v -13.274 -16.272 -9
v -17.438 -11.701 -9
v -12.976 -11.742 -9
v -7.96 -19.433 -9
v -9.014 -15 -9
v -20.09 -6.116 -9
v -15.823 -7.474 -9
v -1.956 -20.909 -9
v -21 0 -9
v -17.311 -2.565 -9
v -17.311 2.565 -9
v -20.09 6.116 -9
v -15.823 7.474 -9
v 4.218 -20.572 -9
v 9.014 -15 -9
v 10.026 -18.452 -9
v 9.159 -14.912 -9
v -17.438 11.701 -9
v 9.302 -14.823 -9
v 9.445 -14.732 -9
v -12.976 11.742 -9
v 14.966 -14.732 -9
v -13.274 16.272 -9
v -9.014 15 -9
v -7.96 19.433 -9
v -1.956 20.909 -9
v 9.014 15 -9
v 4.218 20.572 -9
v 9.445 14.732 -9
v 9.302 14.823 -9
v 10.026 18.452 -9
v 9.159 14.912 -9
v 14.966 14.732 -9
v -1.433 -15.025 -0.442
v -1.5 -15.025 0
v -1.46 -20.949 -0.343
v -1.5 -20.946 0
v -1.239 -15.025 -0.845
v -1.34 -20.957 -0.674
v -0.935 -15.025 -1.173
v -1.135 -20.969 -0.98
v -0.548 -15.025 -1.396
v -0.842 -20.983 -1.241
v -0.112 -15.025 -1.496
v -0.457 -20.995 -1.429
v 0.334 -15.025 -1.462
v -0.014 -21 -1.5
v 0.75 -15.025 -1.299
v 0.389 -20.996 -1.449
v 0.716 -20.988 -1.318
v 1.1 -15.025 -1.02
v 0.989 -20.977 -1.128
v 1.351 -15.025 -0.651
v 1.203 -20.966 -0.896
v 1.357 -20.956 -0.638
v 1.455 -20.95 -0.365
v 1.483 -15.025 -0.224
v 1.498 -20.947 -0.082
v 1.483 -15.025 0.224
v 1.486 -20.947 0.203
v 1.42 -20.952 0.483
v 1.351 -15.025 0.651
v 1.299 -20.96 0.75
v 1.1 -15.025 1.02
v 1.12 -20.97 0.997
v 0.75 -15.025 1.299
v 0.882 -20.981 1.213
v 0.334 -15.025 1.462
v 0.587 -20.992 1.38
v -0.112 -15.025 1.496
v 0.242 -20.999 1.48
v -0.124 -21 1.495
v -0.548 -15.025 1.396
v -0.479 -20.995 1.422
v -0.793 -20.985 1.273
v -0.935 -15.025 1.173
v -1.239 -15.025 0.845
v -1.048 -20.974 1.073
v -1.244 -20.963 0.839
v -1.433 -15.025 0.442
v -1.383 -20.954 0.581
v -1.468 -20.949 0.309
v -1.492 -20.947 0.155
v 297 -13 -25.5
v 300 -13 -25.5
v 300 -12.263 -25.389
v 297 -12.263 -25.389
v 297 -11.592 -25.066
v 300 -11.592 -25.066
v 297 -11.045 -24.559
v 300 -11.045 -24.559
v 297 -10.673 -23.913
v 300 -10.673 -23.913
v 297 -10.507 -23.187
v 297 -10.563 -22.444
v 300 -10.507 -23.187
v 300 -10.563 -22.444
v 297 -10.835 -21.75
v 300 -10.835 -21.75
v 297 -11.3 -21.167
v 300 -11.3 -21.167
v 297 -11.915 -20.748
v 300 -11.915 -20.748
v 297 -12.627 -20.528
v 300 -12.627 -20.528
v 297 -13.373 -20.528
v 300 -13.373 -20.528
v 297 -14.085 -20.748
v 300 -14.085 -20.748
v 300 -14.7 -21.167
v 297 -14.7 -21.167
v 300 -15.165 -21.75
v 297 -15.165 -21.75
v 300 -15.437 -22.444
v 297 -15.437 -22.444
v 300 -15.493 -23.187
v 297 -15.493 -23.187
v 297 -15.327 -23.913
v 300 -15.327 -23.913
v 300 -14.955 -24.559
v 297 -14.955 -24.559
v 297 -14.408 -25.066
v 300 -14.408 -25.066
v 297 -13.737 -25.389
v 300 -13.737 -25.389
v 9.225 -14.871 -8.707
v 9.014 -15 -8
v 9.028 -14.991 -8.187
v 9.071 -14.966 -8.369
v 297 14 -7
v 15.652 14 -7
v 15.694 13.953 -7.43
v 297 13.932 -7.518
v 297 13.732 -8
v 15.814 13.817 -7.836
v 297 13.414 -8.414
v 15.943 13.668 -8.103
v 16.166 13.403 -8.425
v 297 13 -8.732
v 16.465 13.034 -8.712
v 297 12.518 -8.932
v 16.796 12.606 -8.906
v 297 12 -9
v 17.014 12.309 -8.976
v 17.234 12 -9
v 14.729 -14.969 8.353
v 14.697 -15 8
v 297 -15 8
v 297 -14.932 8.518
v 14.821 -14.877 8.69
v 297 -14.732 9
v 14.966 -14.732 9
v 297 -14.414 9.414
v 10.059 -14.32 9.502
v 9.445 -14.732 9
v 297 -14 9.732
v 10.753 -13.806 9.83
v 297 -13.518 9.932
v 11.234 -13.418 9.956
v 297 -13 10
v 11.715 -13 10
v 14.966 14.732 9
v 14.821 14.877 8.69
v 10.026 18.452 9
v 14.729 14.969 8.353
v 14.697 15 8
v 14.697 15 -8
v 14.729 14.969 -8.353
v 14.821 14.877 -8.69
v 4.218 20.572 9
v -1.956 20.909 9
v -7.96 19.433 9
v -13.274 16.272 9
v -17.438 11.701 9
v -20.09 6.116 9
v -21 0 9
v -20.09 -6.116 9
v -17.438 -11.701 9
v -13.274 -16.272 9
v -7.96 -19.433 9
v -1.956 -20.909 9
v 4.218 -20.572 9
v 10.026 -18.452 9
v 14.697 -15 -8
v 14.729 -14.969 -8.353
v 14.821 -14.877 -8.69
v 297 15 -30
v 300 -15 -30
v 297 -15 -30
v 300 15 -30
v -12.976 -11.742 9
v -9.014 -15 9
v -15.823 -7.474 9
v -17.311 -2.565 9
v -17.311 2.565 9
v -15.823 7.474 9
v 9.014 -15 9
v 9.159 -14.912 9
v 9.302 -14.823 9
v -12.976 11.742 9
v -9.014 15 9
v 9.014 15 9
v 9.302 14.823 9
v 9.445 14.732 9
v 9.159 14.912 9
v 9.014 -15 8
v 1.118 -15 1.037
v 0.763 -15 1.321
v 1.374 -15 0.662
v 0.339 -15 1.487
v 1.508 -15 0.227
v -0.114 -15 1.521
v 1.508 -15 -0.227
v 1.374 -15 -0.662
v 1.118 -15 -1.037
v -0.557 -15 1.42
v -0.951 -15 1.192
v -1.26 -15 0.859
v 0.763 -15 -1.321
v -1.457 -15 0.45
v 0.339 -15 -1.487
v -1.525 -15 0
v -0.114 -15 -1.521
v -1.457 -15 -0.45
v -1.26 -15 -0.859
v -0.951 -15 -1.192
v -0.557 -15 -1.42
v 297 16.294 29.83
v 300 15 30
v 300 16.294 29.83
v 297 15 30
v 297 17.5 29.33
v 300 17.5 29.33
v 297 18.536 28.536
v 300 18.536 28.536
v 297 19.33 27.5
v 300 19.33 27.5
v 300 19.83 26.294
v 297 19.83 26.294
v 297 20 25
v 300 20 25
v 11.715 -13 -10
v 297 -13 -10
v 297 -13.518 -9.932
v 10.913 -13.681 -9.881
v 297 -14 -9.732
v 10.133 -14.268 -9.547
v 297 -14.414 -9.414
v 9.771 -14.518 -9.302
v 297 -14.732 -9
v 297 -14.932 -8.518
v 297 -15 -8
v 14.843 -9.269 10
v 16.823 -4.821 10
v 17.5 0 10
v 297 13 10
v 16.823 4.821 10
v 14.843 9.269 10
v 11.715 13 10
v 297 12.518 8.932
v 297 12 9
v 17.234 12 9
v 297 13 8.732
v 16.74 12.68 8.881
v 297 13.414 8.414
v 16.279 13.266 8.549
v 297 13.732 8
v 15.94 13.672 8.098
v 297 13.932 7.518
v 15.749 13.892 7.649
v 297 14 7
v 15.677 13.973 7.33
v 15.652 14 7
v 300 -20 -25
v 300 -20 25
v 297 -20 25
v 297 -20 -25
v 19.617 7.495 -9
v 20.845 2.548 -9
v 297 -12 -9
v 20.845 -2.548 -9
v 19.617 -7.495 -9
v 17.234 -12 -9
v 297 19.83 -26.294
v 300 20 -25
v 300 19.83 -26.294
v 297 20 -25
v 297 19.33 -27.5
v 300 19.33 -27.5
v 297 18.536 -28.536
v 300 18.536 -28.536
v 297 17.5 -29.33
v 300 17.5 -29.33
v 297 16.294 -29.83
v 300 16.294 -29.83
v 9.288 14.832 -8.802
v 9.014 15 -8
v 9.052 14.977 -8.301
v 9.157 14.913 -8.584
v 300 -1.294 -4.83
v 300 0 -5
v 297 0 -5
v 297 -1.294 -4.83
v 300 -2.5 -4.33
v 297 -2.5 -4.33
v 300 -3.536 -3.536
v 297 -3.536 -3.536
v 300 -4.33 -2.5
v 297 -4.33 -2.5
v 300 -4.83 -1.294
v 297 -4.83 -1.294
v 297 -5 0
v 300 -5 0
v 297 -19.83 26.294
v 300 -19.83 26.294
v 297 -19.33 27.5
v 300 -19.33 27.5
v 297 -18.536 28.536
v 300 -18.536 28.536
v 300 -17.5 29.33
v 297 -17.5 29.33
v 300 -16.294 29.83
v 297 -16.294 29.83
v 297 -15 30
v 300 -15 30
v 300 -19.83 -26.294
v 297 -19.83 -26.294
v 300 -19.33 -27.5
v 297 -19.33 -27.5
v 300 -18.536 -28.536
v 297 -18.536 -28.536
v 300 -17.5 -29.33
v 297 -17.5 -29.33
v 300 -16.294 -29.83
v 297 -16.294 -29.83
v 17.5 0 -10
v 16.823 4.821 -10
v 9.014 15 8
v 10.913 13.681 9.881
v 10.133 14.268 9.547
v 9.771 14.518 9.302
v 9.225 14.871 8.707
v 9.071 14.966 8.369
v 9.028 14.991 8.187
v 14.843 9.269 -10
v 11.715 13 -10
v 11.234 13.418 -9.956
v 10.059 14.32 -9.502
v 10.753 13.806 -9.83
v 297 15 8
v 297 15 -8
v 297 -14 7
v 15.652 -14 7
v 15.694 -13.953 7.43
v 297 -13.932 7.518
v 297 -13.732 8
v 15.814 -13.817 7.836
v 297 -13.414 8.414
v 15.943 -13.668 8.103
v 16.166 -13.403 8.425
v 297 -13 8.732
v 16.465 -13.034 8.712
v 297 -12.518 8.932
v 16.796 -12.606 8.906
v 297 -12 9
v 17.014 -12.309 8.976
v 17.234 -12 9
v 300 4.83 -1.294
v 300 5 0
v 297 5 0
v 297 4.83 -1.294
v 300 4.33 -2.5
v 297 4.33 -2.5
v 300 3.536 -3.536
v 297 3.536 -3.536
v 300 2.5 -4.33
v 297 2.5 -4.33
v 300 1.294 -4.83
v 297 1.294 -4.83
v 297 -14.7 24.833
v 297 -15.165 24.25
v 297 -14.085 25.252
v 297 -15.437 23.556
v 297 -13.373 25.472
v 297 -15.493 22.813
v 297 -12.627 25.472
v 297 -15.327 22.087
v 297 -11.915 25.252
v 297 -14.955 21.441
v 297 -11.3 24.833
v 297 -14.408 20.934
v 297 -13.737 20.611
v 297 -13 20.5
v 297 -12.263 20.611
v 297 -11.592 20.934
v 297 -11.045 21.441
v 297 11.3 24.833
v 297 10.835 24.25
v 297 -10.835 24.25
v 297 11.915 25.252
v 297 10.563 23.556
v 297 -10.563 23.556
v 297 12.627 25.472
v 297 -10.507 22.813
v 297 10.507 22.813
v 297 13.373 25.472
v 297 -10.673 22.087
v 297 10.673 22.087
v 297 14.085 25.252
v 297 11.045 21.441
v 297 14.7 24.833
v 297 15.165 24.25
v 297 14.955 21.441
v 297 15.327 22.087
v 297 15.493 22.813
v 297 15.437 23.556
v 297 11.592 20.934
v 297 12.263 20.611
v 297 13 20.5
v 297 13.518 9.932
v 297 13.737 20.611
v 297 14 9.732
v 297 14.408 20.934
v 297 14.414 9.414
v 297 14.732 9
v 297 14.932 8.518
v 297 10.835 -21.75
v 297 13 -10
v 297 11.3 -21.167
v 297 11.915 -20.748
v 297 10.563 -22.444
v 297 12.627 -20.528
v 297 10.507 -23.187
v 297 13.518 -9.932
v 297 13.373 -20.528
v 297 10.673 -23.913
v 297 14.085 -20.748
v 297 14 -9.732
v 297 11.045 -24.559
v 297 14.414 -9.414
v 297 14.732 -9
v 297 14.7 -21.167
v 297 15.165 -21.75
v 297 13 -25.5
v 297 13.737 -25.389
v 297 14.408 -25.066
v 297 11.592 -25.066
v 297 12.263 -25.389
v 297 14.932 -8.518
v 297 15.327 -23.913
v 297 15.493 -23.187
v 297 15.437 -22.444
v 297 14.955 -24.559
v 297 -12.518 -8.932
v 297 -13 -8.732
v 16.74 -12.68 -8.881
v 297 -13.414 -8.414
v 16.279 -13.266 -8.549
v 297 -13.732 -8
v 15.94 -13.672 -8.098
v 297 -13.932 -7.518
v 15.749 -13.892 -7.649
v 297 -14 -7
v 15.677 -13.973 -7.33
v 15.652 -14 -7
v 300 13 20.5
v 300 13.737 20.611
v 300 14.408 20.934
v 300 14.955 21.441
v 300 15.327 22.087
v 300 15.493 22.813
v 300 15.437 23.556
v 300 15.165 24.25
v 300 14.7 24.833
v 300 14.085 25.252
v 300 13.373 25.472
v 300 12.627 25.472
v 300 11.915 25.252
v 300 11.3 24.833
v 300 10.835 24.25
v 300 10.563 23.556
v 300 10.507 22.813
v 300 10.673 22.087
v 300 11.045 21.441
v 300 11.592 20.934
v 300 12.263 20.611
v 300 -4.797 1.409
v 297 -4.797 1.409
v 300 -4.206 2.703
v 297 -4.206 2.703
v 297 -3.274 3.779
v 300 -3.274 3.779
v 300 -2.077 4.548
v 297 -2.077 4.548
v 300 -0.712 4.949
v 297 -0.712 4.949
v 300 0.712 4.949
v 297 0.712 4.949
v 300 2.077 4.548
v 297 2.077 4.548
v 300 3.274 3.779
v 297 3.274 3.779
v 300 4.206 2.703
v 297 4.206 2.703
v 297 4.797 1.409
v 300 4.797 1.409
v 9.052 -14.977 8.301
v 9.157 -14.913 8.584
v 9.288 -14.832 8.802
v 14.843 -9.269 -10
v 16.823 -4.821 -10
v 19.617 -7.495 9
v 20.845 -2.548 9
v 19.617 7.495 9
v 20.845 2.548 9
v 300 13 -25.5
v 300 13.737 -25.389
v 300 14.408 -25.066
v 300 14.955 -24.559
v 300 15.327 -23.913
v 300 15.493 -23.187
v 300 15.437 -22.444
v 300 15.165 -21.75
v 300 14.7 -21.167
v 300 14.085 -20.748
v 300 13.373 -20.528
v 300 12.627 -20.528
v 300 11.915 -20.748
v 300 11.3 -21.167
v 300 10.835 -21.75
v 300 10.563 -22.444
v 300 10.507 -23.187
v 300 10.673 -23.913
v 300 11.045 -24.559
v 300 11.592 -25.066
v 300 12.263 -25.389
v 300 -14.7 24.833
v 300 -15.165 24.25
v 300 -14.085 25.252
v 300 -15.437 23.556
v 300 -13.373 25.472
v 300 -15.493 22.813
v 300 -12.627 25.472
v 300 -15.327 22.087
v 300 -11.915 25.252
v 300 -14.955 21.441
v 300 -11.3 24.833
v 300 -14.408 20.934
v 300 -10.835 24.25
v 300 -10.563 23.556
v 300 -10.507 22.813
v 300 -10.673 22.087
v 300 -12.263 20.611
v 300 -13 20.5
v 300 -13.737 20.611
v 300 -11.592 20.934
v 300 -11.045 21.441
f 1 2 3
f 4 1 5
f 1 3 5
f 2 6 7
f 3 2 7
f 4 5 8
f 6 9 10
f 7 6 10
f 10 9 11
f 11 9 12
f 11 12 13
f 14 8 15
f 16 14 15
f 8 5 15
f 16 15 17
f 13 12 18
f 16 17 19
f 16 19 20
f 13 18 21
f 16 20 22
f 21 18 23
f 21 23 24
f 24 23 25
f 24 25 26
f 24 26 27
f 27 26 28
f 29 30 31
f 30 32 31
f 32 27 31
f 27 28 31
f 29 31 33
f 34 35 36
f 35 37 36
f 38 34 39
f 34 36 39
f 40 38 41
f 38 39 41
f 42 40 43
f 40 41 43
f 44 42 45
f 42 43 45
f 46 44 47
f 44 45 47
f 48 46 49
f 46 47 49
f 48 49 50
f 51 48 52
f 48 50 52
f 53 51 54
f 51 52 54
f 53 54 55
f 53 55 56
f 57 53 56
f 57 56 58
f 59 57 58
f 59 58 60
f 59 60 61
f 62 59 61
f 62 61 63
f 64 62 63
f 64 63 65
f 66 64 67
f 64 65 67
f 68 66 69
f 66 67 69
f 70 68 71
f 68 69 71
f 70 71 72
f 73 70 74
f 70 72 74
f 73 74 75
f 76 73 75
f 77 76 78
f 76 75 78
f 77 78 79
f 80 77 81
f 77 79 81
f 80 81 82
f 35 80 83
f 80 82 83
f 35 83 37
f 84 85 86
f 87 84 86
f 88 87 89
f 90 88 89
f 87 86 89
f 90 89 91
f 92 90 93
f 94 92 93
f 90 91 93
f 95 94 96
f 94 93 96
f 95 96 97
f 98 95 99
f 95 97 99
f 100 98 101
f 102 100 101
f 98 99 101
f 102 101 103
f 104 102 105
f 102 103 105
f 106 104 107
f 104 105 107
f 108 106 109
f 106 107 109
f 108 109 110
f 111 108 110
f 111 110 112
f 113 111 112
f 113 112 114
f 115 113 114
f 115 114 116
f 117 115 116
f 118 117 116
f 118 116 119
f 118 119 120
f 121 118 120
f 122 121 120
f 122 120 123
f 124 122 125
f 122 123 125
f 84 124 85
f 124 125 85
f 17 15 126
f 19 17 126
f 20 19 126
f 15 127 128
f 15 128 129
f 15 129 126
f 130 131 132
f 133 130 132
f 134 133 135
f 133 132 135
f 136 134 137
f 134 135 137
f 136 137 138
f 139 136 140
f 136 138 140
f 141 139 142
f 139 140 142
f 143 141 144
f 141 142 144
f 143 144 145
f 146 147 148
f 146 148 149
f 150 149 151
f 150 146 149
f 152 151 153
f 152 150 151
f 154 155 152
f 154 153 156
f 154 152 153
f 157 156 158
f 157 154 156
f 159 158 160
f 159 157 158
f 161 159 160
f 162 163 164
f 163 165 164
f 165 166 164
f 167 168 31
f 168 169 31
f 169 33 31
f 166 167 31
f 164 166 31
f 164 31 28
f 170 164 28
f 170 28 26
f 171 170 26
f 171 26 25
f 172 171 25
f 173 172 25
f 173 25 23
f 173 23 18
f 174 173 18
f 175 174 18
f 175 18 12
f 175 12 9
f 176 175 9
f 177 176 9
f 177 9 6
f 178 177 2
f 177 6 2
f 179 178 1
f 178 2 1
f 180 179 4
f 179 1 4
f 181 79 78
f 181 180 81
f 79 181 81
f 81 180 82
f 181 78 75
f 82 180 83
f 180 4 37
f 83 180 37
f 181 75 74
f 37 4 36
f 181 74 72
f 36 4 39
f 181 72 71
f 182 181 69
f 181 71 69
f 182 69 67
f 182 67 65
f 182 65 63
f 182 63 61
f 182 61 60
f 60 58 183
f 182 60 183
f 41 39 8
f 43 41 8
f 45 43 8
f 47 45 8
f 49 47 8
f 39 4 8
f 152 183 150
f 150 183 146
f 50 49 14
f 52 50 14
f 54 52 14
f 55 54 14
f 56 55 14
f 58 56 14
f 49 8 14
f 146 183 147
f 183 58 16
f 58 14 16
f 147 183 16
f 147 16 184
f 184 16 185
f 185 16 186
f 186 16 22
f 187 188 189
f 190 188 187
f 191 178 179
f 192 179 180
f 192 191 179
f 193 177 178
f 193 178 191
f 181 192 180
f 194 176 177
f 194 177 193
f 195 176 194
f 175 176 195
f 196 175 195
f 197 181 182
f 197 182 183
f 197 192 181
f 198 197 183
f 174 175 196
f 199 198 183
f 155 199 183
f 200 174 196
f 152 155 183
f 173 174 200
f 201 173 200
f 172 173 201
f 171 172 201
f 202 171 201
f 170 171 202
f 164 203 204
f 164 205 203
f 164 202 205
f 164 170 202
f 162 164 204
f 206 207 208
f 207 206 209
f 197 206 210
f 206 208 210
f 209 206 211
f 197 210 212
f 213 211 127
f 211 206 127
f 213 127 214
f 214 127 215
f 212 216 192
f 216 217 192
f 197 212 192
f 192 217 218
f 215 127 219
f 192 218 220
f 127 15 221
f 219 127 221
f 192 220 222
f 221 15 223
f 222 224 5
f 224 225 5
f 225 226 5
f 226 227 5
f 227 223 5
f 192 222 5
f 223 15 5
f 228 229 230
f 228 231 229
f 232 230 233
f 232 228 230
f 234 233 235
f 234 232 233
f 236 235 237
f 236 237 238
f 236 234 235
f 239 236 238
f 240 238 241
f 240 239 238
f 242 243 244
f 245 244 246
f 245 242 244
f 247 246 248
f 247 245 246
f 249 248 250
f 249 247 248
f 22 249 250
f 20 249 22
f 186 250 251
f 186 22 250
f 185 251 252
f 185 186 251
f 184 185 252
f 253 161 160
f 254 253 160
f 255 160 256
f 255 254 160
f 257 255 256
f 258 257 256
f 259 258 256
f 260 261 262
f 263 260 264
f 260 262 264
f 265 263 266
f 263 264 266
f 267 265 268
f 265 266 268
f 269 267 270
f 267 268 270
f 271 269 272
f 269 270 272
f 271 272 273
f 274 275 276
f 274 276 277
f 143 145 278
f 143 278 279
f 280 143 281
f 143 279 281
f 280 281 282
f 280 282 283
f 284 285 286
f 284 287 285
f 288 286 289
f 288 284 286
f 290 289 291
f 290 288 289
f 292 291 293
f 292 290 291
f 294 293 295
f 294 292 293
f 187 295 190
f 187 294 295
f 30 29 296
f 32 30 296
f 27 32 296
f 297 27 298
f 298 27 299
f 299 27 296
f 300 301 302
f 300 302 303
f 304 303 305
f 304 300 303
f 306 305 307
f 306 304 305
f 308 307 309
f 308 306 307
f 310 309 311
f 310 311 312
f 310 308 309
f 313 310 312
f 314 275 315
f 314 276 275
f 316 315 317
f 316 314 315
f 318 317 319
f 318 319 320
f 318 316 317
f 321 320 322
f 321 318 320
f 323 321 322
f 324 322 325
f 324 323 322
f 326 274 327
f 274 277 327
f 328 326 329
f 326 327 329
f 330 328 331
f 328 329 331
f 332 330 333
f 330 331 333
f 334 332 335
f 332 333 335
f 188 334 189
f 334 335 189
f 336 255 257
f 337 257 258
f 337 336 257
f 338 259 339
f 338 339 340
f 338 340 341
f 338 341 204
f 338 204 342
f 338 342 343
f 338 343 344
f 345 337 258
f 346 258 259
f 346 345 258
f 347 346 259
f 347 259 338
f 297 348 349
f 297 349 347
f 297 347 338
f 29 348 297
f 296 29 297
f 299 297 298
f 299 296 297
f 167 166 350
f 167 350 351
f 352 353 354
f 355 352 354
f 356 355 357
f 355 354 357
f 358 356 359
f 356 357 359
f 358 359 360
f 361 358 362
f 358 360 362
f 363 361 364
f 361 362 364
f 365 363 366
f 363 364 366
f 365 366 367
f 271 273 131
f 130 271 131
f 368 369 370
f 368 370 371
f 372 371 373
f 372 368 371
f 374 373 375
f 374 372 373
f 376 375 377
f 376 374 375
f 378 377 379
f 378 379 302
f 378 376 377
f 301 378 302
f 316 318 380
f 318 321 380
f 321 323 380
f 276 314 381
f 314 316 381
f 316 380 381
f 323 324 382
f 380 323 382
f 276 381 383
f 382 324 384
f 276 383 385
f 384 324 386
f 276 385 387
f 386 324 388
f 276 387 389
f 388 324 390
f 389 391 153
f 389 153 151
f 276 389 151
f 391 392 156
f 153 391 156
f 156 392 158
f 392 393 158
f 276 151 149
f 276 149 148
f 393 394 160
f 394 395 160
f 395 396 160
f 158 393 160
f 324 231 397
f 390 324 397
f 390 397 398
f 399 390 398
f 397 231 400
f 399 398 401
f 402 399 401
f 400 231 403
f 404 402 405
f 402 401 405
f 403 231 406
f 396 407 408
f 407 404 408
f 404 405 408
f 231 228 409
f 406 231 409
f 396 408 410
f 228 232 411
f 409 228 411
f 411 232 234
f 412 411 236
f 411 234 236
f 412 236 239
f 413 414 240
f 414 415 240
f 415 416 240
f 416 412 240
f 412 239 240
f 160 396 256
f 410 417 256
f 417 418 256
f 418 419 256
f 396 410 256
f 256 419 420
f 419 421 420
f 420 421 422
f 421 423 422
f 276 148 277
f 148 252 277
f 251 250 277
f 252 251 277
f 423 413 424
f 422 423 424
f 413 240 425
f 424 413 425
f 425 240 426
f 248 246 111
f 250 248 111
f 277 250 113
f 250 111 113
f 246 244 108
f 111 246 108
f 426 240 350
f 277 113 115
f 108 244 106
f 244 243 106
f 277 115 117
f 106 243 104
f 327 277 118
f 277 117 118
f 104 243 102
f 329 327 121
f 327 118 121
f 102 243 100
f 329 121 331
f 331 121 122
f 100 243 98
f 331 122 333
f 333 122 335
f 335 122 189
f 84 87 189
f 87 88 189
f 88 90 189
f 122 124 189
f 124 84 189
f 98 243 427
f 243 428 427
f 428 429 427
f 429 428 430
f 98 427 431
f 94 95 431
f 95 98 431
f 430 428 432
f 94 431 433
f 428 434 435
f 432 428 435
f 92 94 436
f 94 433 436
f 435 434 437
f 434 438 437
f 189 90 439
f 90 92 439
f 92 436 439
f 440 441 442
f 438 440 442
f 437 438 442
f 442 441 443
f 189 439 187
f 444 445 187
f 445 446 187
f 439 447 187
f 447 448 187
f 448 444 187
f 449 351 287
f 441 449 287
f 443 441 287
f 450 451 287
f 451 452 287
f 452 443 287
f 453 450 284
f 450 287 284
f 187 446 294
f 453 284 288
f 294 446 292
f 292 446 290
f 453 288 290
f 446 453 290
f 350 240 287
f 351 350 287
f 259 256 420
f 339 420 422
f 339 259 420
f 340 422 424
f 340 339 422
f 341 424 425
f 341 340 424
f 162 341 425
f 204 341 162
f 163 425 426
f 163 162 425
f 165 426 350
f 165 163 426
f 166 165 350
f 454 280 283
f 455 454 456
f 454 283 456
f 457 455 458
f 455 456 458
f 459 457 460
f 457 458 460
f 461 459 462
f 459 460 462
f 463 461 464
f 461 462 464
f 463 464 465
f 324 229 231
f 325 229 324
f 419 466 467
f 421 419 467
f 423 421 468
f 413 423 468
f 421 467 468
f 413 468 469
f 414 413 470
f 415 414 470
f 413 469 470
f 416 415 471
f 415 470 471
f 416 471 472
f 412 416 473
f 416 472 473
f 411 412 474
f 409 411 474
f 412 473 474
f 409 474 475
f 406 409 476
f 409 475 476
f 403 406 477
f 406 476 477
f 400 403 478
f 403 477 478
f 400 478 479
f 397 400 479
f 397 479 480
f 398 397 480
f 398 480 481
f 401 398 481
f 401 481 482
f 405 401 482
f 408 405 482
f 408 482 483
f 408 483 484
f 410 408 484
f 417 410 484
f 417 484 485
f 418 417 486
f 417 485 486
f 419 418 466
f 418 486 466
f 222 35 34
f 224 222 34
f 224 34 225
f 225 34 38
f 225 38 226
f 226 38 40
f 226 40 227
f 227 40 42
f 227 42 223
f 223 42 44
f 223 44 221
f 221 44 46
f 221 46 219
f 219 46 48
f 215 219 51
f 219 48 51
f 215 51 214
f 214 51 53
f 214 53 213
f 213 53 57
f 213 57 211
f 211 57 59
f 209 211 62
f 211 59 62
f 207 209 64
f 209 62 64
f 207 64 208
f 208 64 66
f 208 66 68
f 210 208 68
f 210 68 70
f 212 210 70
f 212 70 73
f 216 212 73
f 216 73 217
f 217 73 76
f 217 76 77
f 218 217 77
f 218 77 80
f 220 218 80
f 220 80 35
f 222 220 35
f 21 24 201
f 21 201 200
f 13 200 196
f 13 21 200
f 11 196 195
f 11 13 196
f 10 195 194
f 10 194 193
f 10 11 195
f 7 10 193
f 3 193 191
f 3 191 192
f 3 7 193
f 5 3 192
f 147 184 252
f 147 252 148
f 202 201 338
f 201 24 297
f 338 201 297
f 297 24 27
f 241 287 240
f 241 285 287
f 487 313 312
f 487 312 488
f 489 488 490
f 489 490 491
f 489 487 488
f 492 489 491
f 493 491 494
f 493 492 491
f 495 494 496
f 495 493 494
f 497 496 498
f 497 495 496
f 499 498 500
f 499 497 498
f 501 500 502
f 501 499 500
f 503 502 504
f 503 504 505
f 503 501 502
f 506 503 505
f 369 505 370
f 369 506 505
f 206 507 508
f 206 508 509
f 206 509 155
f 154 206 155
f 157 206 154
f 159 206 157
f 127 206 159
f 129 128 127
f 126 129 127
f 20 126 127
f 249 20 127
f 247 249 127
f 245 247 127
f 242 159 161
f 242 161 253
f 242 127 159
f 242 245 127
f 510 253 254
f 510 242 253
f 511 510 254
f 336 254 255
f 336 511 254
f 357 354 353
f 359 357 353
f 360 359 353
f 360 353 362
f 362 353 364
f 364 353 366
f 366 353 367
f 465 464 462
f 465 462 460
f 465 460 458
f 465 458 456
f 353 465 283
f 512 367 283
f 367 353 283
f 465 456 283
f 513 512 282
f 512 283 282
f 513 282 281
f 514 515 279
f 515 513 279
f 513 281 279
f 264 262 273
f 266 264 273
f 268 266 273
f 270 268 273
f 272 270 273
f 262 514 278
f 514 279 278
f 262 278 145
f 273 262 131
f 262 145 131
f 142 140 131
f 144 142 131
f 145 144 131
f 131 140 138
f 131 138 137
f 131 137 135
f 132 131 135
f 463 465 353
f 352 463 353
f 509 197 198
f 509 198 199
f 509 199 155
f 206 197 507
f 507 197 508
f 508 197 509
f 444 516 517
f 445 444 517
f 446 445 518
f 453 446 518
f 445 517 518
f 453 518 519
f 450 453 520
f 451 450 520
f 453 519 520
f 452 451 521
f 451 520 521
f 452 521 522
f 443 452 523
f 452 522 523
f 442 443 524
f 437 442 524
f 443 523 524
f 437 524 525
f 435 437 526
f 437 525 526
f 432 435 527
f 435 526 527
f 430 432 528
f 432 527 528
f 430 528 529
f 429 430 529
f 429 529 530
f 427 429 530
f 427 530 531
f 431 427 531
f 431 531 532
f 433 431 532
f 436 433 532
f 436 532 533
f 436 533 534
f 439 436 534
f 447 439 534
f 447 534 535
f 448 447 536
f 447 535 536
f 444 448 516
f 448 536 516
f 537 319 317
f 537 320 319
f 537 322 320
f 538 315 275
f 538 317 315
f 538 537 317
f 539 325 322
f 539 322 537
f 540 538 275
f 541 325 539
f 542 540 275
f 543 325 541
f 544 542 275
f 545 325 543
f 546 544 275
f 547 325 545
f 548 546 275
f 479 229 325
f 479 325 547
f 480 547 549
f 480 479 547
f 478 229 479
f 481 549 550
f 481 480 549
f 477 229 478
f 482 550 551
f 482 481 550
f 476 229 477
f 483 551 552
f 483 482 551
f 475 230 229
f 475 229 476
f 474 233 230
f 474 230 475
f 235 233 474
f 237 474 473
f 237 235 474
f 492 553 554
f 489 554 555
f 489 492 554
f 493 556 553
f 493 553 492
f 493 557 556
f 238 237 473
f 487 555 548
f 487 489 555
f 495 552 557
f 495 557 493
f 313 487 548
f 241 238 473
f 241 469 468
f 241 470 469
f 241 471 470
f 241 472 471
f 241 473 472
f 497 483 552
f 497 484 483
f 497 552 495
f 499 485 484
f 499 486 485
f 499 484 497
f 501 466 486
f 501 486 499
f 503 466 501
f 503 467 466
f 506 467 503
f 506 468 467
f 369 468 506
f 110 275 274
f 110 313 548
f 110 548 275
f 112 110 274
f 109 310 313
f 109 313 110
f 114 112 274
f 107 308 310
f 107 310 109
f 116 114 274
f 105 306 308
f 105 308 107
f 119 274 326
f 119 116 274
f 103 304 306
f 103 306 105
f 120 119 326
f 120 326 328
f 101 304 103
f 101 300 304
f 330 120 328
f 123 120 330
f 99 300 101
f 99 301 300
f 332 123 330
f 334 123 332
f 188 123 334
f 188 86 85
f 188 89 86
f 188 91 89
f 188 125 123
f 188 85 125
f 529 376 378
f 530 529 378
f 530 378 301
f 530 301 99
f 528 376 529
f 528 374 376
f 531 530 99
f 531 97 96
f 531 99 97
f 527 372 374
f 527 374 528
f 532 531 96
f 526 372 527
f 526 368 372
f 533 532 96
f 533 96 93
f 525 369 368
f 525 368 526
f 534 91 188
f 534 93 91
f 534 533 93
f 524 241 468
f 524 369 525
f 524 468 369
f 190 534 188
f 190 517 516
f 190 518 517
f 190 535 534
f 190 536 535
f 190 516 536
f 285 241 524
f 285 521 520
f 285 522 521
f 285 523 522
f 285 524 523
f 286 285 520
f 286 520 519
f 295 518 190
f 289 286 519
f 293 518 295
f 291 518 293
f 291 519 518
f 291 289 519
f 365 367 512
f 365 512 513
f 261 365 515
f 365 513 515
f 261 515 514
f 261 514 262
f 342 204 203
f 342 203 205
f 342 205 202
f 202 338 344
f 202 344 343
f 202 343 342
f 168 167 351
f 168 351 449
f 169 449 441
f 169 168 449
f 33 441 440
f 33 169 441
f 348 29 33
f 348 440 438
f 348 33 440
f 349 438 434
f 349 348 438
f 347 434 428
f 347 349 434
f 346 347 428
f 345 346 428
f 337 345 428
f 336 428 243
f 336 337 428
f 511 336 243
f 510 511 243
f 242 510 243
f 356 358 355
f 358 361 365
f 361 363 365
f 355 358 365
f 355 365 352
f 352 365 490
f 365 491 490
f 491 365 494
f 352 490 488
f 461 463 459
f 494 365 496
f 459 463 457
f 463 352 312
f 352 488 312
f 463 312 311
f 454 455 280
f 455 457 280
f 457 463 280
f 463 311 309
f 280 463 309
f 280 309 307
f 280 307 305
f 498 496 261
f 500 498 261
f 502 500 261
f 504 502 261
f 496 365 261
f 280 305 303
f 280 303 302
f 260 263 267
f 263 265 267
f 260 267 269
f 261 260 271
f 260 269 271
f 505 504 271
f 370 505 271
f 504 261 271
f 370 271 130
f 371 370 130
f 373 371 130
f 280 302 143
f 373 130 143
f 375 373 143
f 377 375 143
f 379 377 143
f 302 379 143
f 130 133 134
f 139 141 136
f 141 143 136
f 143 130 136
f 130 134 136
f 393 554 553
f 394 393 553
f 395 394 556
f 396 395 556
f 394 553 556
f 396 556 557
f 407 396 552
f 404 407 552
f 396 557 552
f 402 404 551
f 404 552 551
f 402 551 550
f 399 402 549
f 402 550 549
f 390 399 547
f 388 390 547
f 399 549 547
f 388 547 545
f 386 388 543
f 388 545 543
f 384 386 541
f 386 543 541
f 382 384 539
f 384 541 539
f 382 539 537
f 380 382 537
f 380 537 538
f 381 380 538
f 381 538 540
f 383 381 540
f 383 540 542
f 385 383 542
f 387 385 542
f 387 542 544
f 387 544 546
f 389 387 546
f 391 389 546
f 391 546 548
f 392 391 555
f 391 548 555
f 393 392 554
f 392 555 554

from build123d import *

# Parameters (mm, degrees)
BOSS_EXTRUDE1_DEPTH             = 300
SKETCH9_W                       = 60.00000000000001
SKETCH9_H                       = 40.00000000000001
SKETCH9_R                       = 5.000000000000005
SKETCH9_R_2                     = 2.5000000000000018
BOSS_EXTRUDE2_DEPTH             = 3
BOSS_EXTRUDE3_DEPTH             = 9
BOSS_EXTRUDE3_DEPTH_BACK        = 9
SKETCH10_R                      = 21
CUT_EXTRUDE1_DEPTH              = 19
CUT_EXTRUDE1_DEPTH_BACK         = 19
F_3_0MM_DOWEL_HOLE1_D           = 3
F_3_0MM_DOWEL_HOLE1_DEPTH       = 7.5
F_3_0MM_DOWEL_HOLE1_CSINK_D     = 3.05
F_3_0MM_DOWEL_HOLE1_CSINK_ANGLE = 90
F_3_0MM_DOWEL_HOLE1_TIP         = 0.9012909285413404
FILLET1_R                       = 5


with BuildPart() as part:
    # Sketch2 → Boss-Extrude1 (new body)
    with BuildSketch(Plane(origin=(0, 0, 0), x_dir=(0, 0, -1), z_dir=(1, 0, 0))):
        with BuildLine():
            Line((-7.999999999999989, 15), (7.999999999999983, 15))
            ThreePointArc((7.999999999999983, 15), (9.414213562373092, 14.414213562373094), (9.999999999999996, 12.999999999999986))
            Line((9.999999999999996, 12.999999999999986), (10, -12.999999999999986))
            ThreePointArc((10, -12.999999999999986), (9.414213562373096, -14.414213562373094), (7.999999999999987, -15))
            Line((7.999999999999987, -15), (-7.999999999999987, -15))
            ThreePointArc((-7.999999999999987, -15), (-9.414213562373096, -14.414213562373094), (-10, -12.999999999999986))
            Line((-10, -12.999999999999986), (-10.000000000000004, 12.999999999999986))
            ThreePointArc((-10.000000000000004, 12.999999999999986), (-9.4142135623731, 14.414213562373096), (-7.999999999999989, 15))
        make_face()
        with BuildLine():
            Line((-6.999999999999988, 13.999999999999996), (6.999999999999982, 13.999999999999996))
            ThreePointArc((6.999999999999982, 13.999999999999996), (8.41421356237309, 13.41421356237309), (8.999999999999996, 11.999999999999982))
            Line((8.999999999999996, 11.999999999999982), (9.000000000000002, -11.999999999999988))
            ThreePointArc((9.000000000000002, -11.999999999999988), (8.414213562373096, -13.414213562373098), (6.999999999999987, -14.000000000000002))
            Line((6.999999999999987, -14.000000000000002), (-6.999999999999984, -14.000000000000002))
            ThreePointArc((-6.999999999999984, -14.000000000000002), (-8.414213562373092, -13.414213562373096), (-8.999999999999998, -11.999999999999988))
            Line((-8.999999999999998, -11.999999999999988), (-9.000000000000004, 11.999999999999982))
            ThreePointArc((-9.000000000000004, 11.999999999999982), (-8.4142135623731, 13.414213562373092), (-6.999999999999988, 13.999999999999996))
        make_face(mode=Mode.SUBTRACT)
    extrude(amount=BOSS_EXTRUDE1_DEPTH)

    # Sketch9 → Boss-Extrude2 (add)
    with BuildSketch(Plane(origin=(300, 0, 0), x_dir=(0, 0, -1), z_dir=(1, 0, 0))):
        Rectangle(SKETCH9_W, SKETCH9_H)
        Circle(SKETCH9_R, mode=Mode.SUBTRACT)
        with Locations((-22.999999999999996, -13)):
            Circle(SKETCH9_R_2, mode=Mode.SUBTRACT)
        with Locations((-23, 13)):
            Circle(SKETCH9_R_2, mode=Mode.SUBTRACT)
        with Locations((22.999999999999996, -13)):
            Circle(SKETCH9_R_2, mode=Mode.SUBTRACT)
        with Locations((23, 13)):
            Circle(SKETCH9_R_2, mode=Mode.SUBTRACT)
    extrude(amount=-BOSS_EXTRUDE2_DEPTH)

    # Sketch10 → Boss-Extrude3 (add, two sides: drawn at the far end of the back side and taken through both)
    with BuildSketch(Plane.XY.offset(-BOSS_EXTRUDE3_DEPTH_BACK)):
        Circle(SKETCH10_R)
        with BuildLine():
            Line((9.013878188659977, -15.000000000000002), (-9.013878188659977, -15.000000000000002))
            ThreePointArc((-9.013878188659973, -15.000000000000004), (-17.500000000000004, -1.34e-14), (-9.013878188659987, 14.999999999999995))
            Line((-9.013878188659984, 14.999999999999996), (9.013878188659984, 14.999999999999996))
            ThreePointArc((9.013878188659984, 14.999999999999996), (17.500000000000004, -7.11e-15), (9.013878188659977, -15.000000000000004))
        make_face(mode=Mode.SUBTRACT)
    extrude(amount=BOSS_EXTRUDE3_DEPTH + BOSS_EXTRUDE3_DEPTH_BACK)

    # Sketch10<3> → Cut-Extrude1 (cut, two sides: drawn at the far end of the back side and taken through both)
    with BuildSketch(Plane.XY.offset(-CUT_EXTRUDE1_DEPTH_BACK)):
        with BuildLine():
            Line((-9.013878188659977, -15.000000000000002), (9.013878188659977, -15.000000000000002))
            ThreePointArc((9.013878188659966, -15.000000000000009), (15.231429156542559, -8.617050878881091), (17.500000000000004, -4.29e-15))
            ThreePointArc((17.500000000000004, 0), (15.231429156542566, 8.617050878881079), (9.013878188659985, 14.999999999999996))
            Line((9.013878188659984, 14.999999999999996), (-9.013878188659984, 14.999999999999996))
            ThreePointArc((-9.013878188659987, 14.999999999999995), (-17.500000000000004, -1.34e-14), (-9.013878188659973, -15.000000000000004))
        make_face()
    extrude(amount=CUT_EXTRUDE1_DEPTH + CUT_EXTRUDE1_DEPTH_BACK, mode=Mode.SUBTRACT)

    # Ø3.0mm Dowel Hole1
    with Locations(Plane(origin=(0, -15.000000000000002, 0), x_dir=(1, 0, 0), z_dir=(0, 1, 0))):
        with Locations((0, 0)):
            CounterSinkHole(F_3_0MM_DOWEL_HOLE1_D / 2, F_3_0MM_DOWEL_HOLE1_CSINK_D / 2, depth=F_3_0MM_DOWEL_HOLE1_DEPTH, counter_sink_angle=F_3_0MM_DOWEL_HOLE1_CSINK_ANGLE)
            with Locations((0, 0, -(F_3_0MM_DOWEL_HOLE1_DEPTH + F_3_0MM_DOWEL_HOLE1_TIP / 2))):  # 118° drill point
                Cone(0, F_3_0MM_DOWEL_HOLE1_D / 2, F_3_0MM_DOWEL_HOLE1_TIP, mode=Mode.SUBTRACT)

    # Fillet1
    fillet1_edges = [part.edges().sort_by_distance(p)[0] for p in [
        (298.5, 20.000000000000004, 30),
        (298.5, -20.000000000000004, 30),
        (298.5, -20.000000000000004, -30),
        (298.5, 20.000000000000004, -30),
    ]]
    fillet(fillet1_edges, radius=FILLET1_R)


solid = part.part
